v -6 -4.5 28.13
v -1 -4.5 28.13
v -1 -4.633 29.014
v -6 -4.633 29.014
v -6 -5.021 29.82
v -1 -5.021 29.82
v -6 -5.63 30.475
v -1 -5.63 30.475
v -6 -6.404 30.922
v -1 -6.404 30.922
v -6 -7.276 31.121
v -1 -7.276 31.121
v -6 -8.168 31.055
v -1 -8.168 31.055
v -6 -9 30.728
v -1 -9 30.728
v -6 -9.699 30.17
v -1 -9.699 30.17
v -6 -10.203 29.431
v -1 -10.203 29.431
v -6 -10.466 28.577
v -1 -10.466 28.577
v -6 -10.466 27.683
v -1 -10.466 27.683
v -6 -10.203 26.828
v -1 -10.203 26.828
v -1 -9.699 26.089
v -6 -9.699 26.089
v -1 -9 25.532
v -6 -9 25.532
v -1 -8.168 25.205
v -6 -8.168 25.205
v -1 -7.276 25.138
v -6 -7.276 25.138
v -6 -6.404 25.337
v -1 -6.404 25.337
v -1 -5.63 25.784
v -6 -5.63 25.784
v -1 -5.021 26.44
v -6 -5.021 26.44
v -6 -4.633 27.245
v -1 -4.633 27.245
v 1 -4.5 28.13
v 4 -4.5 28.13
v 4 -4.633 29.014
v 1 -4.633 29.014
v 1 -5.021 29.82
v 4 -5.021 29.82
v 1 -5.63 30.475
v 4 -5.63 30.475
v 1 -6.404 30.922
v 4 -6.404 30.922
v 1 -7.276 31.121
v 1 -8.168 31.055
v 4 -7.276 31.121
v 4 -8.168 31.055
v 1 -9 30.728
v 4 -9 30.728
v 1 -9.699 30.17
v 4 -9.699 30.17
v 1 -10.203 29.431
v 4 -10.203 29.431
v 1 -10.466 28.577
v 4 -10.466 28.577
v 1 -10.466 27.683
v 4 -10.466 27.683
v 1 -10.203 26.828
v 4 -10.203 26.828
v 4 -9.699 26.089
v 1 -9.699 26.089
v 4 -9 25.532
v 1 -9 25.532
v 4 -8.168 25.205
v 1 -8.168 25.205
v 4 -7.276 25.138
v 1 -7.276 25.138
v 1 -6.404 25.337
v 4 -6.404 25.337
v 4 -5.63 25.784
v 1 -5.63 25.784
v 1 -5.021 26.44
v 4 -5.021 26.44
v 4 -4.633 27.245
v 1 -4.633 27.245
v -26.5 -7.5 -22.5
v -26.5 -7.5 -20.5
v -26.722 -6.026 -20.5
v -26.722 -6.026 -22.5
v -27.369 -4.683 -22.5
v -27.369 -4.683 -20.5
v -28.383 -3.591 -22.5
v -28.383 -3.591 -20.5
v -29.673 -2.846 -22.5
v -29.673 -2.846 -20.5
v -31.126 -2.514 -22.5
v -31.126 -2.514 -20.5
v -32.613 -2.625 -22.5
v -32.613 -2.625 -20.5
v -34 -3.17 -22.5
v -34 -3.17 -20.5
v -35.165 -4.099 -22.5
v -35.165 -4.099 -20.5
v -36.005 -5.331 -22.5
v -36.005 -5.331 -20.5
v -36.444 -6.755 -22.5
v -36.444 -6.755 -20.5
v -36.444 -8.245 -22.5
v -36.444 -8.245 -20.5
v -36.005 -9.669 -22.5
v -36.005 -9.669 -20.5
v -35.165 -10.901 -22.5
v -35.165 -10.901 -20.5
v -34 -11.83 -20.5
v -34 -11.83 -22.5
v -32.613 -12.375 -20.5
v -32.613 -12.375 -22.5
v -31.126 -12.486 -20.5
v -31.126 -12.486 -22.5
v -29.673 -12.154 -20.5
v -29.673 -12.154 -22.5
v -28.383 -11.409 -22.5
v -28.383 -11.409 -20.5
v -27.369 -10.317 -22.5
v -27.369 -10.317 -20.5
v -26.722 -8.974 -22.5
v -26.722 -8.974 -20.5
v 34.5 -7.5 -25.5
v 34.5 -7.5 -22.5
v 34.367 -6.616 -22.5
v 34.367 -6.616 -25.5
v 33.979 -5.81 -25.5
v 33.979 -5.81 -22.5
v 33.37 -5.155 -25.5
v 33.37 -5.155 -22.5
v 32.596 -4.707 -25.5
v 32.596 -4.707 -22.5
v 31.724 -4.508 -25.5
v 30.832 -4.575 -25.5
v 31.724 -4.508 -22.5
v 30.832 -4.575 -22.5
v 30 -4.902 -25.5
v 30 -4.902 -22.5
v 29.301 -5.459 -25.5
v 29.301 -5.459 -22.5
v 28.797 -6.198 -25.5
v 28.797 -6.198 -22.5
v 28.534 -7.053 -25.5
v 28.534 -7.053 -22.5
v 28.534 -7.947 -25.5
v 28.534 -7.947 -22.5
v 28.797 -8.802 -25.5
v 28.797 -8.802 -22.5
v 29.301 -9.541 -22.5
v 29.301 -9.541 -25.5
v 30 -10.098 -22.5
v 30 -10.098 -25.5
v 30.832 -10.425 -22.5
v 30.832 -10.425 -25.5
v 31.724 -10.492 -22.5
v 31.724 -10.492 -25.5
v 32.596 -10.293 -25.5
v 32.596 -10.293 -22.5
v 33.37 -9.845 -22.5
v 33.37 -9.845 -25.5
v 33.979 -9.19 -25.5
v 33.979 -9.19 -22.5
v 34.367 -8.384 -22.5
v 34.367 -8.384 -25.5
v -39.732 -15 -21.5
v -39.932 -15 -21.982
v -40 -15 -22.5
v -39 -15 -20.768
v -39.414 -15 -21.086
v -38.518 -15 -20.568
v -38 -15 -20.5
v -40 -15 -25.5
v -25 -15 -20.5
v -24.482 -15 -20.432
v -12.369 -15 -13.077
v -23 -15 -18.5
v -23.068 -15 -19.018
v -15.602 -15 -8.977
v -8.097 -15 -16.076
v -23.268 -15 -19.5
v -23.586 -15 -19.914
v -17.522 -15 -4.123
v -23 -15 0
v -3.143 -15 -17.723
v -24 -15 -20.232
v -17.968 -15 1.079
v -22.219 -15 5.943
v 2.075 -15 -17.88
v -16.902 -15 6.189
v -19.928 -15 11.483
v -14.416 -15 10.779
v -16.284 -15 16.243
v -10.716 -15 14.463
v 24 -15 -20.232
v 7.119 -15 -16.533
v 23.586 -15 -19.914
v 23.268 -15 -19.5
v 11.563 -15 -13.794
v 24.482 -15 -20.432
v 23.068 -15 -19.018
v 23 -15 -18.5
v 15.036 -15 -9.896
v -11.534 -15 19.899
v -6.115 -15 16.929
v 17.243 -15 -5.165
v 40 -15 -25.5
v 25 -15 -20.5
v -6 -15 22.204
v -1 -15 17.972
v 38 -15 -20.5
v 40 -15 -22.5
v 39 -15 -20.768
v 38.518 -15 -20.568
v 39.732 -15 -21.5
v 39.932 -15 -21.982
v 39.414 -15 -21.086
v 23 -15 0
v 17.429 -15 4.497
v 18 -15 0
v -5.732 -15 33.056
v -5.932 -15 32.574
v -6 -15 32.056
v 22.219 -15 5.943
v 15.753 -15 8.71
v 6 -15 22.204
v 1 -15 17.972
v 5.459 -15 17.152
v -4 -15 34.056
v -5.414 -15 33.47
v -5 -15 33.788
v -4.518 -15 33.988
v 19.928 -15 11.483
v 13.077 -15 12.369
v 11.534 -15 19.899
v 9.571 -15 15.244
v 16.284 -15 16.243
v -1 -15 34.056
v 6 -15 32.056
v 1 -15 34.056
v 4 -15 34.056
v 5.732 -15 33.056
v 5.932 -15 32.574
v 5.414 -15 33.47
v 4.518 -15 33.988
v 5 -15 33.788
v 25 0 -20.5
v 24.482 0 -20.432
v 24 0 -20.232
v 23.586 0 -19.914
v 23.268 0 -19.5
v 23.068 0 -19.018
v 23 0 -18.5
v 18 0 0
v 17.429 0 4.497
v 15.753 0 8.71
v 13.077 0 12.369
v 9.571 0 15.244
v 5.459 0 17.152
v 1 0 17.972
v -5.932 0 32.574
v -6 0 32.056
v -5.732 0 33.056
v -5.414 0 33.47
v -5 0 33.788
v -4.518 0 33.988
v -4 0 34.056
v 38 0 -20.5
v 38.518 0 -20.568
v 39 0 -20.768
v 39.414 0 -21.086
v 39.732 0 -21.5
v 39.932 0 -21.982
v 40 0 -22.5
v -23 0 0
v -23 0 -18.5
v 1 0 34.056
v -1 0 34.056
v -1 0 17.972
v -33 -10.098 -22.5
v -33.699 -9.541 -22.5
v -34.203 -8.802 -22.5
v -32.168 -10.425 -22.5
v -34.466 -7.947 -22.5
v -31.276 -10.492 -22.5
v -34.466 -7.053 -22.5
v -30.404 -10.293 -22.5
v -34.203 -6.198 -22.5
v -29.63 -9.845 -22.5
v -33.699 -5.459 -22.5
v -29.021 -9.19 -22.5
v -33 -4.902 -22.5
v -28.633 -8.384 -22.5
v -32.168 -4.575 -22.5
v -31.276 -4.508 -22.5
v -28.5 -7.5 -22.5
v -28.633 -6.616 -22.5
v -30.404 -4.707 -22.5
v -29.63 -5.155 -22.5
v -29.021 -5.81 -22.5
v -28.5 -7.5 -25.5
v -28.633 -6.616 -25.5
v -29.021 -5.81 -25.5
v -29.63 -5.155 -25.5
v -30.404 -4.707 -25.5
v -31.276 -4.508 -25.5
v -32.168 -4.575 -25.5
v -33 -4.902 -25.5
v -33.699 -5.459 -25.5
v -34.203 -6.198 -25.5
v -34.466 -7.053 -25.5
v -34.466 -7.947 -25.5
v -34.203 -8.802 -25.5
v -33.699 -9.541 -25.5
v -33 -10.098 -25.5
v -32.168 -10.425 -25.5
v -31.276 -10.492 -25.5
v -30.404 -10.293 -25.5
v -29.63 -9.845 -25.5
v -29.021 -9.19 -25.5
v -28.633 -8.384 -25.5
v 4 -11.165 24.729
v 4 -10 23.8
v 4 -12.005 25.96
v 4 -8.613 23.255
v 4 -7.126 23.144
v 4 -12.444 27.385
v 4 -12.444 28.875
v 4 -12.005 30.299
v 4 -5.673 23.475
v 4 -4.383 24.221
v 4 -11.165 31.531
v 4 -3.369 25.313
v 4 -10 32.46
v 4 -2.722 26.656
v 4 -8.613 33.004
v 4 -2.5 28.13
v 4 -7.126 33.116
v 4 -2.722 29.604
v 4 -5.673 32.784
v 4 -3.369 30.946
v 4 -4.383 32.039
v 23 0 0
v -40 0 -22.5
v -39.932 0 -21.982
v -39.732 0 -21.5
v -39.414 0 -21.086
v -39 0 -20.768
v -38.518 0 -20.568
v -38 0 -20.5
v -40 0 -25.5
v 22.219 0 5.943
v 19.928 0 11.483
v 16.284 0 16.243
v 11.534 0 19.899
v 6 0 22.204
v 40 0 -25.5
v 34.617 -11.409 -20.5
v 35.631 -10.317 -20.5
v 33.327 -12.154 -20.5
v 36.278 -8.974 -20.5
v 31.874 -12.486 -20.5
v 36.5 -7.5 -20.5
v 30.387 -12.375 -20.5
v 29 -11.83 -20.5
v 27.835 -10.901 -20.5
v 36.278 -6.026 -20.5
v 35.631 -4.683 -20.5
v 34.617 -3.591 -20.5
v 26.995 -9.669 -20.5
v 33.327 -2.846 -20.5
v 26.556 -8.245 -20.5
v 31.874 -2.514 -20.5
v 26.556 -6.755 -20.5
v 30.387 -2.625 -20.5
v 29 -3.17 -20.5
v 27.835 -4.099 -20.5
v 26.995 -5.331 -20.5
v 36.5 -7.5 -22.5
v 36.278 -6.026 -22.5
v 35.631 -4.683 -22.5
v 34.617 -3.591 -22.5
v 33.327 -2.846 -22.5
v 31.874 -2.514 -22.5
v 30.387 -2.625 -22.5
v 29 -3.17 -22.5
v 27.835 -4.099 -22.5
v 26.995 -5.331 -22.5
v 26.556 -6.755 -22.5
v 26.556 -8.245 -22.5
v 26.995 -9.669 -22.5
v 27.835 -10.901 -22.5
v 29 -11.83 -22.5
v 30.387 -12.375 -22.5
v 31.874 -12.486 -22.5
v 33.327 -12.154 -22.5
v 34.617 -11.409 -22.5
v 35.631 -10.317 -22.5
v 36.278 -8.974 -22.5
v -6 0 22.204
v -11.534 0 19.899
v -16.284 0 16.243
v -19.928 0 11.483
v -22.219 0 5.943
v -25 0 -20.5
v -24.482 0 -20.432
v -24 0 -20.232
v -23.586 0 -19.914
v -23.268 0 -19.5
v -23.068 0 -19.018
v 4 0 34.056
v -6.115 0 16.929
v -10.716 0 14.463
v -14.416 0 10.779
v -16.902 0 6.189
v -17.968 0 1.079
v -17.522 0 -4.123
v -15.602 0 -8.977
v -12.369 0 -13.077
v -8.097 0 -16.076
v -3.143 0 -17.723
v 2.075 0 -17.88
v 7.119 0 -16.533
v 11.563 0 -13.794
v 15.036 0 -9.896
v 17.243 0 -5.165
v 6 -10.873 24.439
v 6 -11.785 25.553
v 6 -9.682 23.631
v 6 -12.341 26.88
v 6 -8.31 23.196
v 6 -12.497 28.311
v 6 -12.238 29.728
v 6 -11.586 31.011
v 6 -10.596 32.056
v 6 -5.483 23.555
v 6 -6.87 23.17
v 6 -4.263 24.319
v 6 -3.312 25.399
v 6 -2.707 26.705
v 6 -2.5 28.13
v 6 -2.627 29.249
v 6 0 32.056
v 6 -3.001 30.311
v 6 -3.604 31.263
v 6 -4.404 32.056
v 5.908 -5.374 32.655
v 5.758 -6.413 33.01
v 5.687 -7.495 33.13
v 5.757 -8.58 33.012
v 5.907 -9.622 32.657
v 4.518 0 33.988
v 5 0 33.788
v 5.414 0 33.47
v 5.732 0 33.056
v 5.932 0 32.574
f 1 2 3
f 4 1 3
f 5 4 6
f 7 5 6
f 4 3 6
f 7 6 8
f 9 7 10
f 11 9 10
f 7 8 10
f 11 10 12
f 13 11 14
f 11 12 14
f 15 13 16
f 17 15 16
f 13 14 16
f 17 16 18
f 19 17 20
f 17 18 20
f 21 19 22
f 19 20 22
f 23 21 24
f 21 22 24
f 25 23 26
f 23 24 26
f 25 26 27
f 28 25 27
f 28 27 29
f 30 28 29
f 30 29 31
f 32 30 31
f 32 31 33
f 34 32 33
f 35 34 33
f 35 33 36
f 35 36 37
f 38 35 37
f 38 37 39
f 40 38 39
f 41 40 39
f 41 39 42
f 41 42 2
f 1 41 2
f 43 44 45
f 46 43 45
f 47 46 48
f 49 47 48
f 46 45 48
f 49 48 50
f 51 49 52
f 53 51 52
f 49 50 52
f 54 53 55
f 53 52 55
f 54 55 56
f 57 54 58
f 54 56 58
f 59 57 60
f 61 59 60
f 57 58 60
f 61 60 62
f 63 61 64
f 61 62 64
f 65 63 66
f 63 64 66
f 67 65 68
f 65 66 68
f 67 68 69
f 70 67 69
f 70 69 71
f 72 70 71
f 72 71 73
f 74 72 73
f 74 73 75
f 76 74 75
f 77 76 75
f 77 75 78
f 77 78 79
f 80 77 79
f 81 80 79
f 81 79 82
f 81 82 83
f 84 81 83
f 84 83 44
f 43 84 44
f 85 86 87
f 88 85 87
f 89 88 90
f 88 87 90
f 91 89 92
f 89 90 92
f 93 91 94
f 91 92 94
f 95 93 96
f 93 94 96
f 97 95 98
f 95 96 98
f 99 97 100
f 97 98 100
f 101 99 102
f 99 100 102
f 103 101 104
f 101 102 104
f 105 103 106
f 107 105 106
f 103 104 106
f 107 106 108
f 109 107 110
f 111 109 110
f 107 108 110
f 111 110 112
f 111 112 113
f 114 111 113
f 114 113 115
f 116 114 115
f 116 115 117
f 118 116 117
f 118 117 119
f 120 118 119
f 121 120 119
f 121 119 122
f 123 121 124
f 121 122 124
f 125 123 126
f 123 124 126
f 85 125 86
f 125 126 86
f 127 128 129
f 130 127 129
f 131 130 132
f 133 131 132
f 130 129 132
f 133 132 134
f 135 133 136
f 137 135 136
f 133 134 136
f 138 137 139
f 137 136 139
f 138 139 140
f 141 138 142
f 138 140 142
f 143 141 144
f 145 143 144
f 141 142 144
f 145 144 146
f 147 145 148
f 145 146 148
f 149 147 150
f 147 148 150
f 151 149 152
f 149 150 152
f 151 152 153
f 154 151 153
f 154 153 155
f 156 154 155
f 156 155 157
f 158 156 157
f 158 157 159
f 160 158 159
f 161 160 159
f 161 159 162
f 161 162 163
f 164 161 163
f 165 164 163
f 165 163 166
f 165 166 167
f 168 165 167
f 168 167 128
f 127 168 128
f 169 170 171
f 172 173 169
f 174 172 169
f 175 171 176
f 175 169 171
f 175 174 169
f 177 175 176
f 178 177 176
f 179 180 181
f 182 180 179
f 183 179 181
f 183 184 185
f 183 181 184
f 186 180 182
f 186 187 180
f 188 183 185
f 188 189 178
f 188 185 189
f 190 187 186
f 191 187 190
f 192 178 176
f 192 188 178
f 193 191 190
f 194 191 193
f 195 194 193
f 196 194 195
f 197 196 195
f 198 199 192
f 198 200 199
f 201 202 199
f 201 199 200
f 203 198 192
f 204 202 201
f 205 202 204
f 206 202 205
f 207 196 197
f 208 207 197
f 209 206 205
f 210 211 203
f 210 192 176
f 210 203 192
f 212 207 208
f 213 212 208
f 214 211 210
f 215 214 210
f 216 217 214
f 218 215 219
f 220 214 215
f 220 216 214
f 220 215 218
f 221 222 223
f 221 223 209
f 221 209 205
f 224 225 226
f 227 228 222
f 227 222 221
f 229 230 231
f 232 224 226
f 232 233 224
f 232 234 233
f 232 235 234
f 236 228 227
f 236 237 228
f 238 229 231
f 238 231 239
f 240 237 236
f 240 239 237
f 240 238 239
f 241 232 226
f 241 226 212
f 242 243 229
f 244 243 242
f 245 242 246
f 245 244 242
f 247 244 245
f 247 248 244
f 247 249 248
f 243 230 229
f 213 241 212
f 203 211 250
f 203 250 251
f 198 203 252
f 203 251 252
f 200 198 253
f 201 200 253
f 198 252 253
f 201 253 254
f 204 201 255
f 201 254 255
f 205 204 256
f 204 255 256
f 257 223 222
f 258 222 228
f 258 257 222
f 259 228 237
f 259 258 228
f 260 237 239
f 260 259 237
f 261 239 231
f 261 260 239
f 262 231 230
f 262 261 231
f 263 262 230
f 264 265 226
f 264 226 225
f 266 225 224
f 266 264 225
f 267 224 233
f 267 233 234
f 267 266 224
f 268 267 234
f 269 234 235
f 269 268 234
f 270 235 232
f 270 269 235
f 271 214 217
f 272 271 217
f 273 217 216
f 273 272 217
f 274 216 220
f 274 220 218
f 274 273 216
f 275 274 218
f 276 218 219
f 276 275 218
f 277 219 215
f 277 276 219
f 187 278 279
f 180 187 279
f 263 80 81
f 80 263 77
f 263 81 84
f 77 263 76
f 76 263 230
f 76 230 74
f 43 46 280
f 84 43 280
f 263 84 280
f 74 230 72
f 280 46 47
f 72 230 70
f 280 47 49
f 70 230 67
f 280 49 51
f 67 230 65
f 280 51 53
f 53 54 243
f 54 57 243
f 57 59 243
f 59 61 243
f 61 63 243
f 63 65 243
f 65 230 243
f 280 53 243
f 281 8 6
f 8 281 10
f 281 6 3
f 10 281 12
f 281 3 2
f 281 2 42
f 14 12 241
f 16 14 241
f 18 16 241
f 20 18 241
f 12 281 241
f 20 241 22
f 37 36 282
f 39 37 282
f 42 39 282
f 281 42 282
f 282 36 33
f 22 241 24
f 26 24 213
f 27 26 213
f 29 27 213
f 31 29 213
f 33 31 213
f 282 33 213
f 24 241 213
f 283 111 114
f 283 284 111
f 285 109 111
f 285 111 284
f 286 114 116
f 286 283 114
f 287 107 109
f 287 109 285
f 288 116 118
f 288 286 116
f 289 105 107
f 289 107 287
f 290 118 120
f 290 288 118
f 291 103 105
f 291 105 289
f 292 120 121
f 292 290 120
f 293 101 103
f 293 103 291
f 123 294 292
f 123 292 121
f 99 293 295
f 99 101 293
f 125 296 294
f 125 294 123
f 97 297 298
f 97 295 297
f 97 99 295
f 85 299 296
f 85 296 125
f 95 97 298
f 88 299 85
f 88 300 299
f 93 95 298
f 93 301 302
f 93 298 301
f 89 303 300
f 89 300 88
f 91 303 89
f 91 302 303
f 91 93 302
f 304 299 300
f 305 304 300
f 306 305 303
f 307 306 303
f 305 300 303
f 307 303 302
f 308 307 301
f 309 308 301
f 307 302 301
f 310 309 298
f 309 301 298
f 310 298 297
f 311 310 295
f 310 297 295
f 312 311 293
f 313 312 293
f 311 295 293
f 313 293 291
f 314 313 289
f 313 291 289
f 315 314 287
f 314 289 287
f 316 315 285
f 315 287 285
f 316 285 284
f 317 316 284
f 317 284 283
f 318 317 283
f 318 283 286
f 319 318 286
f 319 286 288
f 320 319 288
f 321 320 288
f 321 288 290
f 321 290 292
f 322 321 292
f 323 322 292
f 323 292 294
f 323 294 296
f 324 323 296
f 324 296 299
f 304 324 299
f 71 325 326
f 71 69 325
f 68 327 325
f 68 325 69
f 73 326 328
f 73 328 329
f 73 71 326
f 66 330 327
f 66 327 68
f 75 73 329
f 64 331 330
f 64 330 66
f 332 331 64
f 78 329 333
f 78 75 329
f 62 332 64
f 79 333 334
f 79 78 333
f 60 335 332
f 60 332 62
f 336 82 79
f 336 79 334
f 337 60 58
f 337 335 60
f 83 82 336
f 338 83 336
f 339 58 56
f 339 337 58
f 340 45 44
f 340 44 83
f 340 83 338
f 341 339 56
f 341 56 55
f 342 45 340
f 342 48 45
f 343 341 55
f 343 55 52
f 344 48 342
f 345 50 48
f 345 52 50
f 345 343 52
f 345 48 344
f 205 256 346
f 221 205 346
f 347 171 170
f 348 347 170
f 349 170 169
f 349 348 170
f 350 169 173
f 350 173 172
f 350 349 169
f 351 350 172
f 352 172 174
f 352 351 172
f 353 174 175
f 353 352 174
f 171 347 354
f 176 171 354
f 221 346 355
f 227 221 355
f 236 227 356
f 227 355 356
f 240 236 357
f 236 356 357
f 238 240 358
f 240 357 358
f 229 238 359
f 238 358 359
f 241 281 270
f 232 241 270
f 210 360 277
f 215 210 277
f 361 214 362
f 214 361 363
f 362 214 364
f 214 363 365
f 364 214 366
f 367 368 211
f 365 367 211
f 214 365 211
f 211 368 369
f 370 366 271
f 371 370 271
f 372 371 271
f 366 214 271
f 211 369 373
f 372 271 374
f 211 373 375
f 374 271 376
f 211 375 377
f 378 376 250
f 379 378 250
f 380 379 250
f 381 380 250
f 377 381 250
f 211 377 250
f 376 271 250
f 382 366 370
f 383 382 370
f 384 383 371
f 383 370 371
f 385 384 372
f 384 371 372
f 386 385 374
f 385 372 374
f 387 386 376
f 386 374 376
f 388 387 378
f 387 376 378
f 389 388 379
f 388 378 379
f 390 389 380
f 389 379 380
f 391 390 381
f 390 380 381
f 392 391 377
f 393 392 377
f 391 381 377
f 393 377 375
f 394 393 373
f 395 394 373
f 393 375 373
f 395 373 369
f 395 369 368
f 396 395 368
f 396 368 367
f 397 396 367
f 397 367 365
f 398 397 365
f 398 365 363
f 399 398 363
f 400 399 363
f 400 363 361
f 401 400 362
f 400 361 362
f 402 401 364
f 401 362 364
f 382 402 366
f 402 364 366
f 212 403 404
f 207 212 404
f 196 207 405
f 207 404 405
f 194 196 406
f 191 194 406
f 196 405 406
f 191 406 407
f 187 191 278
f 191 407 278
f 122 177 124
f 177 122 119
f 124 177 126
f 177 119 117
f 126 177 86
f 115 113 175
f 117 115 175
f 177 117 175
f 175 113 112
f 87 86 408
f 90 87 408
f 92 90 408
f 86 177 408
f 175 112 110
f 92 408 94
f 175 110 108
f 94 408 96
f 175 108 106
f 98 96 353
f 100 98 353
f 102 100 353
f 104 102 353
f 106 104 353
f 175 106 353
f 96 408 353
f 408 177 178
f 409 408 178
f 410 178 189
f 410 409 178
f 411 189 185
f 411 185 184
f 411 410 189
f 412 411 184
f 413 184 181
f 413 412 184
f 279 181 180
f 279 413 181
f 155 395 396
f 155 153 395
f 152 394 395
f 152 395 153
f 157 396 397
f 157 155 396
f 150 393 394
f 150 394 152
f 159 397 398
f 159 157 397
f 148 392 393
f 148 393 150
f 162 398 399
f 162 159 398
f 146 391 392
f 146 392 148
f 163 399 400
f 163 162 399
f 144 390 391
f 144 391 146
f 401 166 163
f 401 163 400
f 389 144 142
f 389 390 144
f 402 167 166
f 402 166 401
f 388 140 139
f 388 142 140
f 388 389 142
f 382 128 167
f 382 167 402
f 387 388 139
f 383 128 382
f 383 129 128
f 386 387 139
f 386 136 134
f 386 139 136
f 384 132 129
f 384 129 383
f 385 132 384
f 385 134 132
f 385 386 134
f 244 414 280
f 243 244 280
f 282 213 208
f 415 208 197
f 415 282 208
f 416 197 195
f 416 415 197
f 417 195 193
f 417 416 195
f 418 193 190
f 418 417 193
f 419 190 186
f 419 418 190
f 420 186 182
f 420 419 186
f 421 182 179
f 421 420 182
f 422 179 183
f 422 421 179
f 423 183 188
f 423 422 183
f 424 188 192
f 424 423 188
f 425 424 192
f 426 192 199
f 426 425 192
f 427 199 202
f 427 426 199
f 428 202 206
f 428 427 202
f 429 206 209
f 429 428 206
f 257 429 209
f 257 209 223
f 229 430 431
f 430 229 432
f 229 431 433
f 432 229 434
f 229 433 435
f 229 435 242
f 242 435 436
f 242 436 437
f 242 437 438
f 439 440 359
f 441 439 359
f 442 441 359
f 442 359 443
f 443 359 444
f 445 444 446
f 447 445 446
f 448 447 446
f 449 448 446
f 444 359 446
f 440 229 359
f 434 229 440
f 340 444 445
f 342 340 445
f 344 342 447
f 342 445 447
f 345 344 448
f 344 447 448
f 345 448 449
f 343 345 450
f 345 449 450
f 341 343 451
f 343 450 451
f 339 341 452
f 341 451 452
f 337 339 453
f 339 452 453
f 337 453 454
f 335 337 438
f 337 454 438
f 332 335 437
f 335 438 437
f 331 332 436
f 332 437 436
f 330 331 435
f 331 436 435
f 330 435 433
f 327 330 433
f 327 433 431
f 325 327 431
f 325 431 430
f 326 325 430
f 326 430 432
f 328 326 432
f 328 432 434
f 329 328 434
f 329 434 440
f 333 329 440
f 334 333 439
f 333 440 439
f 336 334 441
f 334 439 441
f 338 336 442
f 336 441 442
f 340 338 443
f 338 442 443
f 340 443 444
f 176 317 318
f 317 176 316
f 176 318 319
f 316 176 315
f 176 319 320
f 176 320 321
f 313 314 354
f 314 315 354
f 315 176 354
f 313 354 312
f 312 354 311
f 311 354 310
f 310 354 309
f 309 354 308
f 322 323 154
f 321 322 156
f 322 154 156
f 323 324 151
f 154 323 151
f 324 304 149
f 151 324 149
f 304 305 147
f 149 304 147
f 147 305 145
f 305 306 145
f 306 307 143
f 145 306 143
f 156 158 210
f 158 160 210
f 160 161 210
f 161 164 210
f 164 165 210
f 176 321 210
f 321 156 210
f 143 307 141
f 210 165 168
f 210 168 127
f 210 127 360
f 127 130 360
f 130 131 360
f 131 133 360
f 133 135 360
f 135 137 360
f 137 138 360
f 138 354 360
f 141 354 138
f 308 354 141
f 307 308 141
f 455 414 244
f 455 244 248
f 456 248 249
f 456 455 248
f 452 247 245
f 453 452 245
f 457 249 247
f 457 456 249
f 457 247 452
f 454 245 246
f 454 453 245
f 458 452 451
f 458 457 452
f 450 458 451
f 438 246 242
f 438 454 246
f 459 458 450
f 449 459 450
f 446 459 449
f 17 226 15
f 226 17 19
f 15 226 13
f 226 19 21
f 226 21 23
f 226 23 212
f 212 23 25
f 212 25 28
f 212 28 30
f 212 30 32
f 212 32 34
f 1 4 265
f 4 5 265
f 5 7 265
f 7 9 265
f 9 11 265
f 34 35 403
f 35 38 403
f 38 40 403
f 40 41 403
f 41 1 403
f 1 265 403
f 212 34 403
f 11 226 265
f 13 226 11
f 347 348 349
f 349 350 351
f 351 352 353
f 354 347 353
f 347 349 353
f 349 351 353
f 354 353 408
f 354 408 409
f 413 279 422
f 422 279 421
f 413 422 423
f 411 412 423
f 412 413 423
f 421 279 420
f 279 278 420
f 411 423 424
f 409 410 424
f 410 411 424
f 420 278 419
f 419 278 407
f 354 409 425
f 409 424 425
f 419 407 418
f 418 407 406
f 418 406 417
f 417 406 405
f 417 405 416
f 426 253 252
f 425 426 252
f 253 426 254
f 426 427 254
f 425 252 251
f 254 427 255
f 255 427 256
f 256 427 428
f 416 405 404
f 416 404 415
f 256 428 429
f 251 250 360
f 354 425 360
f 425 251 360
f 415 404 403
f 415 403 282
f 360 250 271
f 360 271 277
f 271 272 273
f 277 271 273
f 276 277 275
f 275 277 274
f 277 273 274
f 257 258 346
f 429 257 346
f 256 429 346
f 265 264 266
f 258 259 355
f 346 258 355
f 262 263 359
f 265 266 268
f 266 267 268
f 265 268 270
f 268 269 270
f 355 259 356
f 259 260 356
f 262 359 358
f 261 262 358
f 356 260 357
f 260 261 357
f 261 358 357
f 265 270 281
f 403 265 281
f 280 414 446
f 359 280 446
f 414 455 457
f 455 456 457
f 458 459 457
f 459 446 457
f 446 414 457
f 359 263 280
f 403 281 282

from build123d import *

# Parameters (mm, degrees)
F0_R         = 18
F1_DEPTH     = 15
F3_DEPTH     = 25
F4_R         = 3
F5_DEPTH     = 25
F4_R_2       = 5
F6_DEPTH     = 2
F7_R         = 3
F8_DEPTH     = 25
F7_R_2       = 5
F9_DEPTH     = 2
F10_R        = 3
F11_DEPTH    = 25
F10_R_2      = 5
F12_DEPTH    = 2
F13_T1_DEPTH = 15
F13_T3_DEPTH = 25


# Not quite as in the source:
# - a fillet or chamfer that OpenCascade refuses, or shapes differently, is made with other operations: its cross-section is extruded or revolved along the edge and cut away or added


with BuildPart() as f1:
    # F0 (on Front) → F1 (new body)
    with BuildSketch(Plane.XZ):
        with BuildLine():
            Line((23, -20.5), (10.4283268073, -20.5))
            ThreePointArc((10.4283268073, -20.5), (0, -23), (-10.4283268073, -20.5))
            Line((-10.4283268073, -20.5), (-23, -20.5))
            Line((-23, -20.5), (-40, -20.5))
            Line((-40, -20.5), (-40, -25.5))
            Line((-40, -25.5), (40, -25.5))
            Line((40, -25.5), (40, -20.5))
            Line((40, -20.5), (23, -20.5))
        make_face()
        with BuildLine():
            Line((-23, -20.5), (-10.4283268073, -20.5))
            ThreePointArc((-10.4283268073, -20.5), (-19.606778376, -12.0239029319), (-23, 0))
            Line((-23, 0), (-23, -20.5))
        make_face()
        with BuildLine():
            ThreePointArc((10.4283268073, -20.5), (19.606778376, -12.0239029319), (23, 0))
            ThreePointArc((23, 0), (18.2619823677, 13.9821314541), (6, 22.2036033112))
            Line((6, 22.2036033112), (6, 19.0559069812))
            Line((6, 19.0559069812), (-6, 19.0559069812))
            Line((-6, 19.0559069812), (-6, 22.2036033112))
            ThreePointArc((-6, 22.2036033112), (-18.2619823677, 13.9821314541), (-23, 0))
            ThreePointArc((-23, 0), (-19.606778376, -12.0239029319), (-10.4283268073, -20.5))
            Line((-10.4283268073, -20.5), (10.4283268073, -20.5))
        make_face()
        Circle(F0_R, mode=Mode.SUBTRACT)
        with BuildLine():
            Line((23, -20.5), (23, 0))
            ThreePointArc((23, 0), (19.606778376, -12.0239029319), (10.4283268073, -20.5))
            Line((10.4283268073, -20.5), (23, -20.5))
        make_face()
        with BuildLine():
            ThreePointArc((-10.4283268073, -20.5), (0, -23), (10.4283268073, -20.5))
            Line((10.4283268073, -20.5), (-10.4283268073, -20.5))
        make_face()
        with BuildLine():
            ThreePointArc((-6, 22.2036033112), (0, 23), (6, 22.2036033112))
            Line((6, 22.2036033112), (6, 34.0559069812))
            Line((6, 34.0559069812), (-6, 34.0559069812))
            Line((-6, 34.0559069812), (-6, 22.2036033112))
        make_face()
        with BuildLine():
            Line((6, 19.0559069812), (6, 22.2036033112))
            ThreePointArc((6, 22.2036033112), (0, 23), (-6, 22.2036033112))
            Line((-6, 22.2036033112), (-6, 19.0559069812))
            Line((-6, 19.0559069812), (6, 19.0559069812))
        make_face()
    extrude(amount=F1_DEPTH)

    # F2 (on face) → F3 (cut)
    with BuildSketch(Plane.XZ.offset(15)):
        with BuildLine():
            Line((1, 34.0559069812), (-1, 34.0559069812))
            Line((-1, 34.0559069812), (-1, 17.9722007556))
            ThreePointArc((-1, 17.9722007556), (0, 18), (1, 17.9722007556))
            Line((1, 17.9722007556), (1, 34.0559069812))
        make_face()
    extrude(amount=-F3_DEPTH, mode=Mode.SUBTRACT)

    # F4 (on face) → F5 (cut)
    with BuildSketch(Plane.XY.offset(-20.5)):
        with Locations((31.5, -7.5)):
            Circle(F4_R)
    extrude(amount=-F5_DEPTH, mode=Mode.SUBTRACT)

    # F4 (on face) → F6 (cut)
    with BuildSketch(Plane.XY.offset(-20.5)):
        with Locations((31.5, -7.5)):
            Circle(F4_R_2)
        with Locations((31.5, -7.5)):
            Circle(F4_R, mode=Mode.SUBTRACT)
    extrude(amount=-F6_DEPTH, mode=Mode.SUBTRACT)

    # F7 (on face) → F8 (cut)
    with BuildSketch(Plane.XY.offset(-20.5)):
        with Locations((-31.5, -7.5)):
            Circle(F7_R)
    extrude(amount=-F8_DEPTH, mode=Mode.SUBTRACT)

    # F7 (on face) → F9 (cut)
    with BuildSketch(Plane.XY.offset(-20.5)):
        with Locations((-31.5, -7.5)):
            Circle(F7_R_2)
        with Locations((-31.5, -7.5)):
            Circle(F7_R, mode=Mode.SUBTRACT)
    extrude(amount=-F9_DEPTH, mode=Mode.SUBTRACT)

    # F10 (on face) → F11 (cut)
    with BuildSketch(Plane.YZ.offset(6)):
        with Locations((-7.5, 28.1297551462)):
            Circle(F10_R)
    extrude(amount=-F11_DEPTH, mode=Mode.SUBTRACT)

    # F10 (on face) → F12 (cut)
    with BuildSketch(Plane.YZ.offset(6)):
        with Locations((-7.5, 28.1297551462)):
            Circle(F10_R_2)
        with Locations((-7.5, 28.1297551462)):
            Circle(F10_R, mode=Mode.SUBTRACT)
    extrude(amount=-F12_DEPTH, mode=Mode.SUBTRACT)

    # F13: fillet of radius 2 on 6 edges, made by hand

    # F13_s2 → F13_t1 (join)
    with BuildSketch(Plane.XZ):
        with BuildLine():
            ThreePointArc((25, -20.5), (23.5857864376, -19.9142135624), (23, -18.5))
            Line((23, -18.5), (23, -20.5))
            Line((23, -20.5), (25, -20.5))
        make_face()
        with BuildLine():
            ThreePointArc((-25, -20.5), (-23.5857864376, -19.9142135624), (-23, -18.5))
            Line((-23, -18.5), (-23, -20.5))
            Line((-23, -20.5), (-25, -20.5))
        make_face()
    extrude(amount=F13_T1_DEPTH)

    # F13_s4 → F13_t3 (cut)
    with BuildSketch(Plane.XZ.offset(-5)):
        with BuildLine():
            ThreePointArc((-6, 32.0559069812), (-5.4142135624, 33.4701205436), (-4, 34.0559069812))
            Line((-4, 34.0559069812), (-6, 34.0559069812))
            Line((-6, 34.0559069812), (-6, 32.0559069812))
        make_face()
        with BuildLine():
            ThreePointArc((4, 34.0559069812), (5.4142135624, 33.4701205436), (6, 32.0559069812))
            Line((6, 32.0559069812), (6, 34.0559069812))
            Line((6, 34.0559069812), (4, 34.0559069812))
        make_face()
        with BuildLine():
            ThreePointArc((38, -20.5), (39.4142135624, -21.0857864376), (40, -22.5))
            Line((40, -22.5), (40, -20.5))
            Line((40, -20.5), (38, -20.5))
        make_face()
        with BuildLine():
            ThreePointArc((-40, -22.5), (-39.4142135624, -21.0857864376), (-38, -20.5))
            Line((-38, -20.5), (-40, -20.5))
            Line((-40, -20.5), (-40, -22.5))
        make_face()
    extrude(amount=F13_T3_DEPTH, mode=Mode.SUBTRACT)


solid = f1.part
